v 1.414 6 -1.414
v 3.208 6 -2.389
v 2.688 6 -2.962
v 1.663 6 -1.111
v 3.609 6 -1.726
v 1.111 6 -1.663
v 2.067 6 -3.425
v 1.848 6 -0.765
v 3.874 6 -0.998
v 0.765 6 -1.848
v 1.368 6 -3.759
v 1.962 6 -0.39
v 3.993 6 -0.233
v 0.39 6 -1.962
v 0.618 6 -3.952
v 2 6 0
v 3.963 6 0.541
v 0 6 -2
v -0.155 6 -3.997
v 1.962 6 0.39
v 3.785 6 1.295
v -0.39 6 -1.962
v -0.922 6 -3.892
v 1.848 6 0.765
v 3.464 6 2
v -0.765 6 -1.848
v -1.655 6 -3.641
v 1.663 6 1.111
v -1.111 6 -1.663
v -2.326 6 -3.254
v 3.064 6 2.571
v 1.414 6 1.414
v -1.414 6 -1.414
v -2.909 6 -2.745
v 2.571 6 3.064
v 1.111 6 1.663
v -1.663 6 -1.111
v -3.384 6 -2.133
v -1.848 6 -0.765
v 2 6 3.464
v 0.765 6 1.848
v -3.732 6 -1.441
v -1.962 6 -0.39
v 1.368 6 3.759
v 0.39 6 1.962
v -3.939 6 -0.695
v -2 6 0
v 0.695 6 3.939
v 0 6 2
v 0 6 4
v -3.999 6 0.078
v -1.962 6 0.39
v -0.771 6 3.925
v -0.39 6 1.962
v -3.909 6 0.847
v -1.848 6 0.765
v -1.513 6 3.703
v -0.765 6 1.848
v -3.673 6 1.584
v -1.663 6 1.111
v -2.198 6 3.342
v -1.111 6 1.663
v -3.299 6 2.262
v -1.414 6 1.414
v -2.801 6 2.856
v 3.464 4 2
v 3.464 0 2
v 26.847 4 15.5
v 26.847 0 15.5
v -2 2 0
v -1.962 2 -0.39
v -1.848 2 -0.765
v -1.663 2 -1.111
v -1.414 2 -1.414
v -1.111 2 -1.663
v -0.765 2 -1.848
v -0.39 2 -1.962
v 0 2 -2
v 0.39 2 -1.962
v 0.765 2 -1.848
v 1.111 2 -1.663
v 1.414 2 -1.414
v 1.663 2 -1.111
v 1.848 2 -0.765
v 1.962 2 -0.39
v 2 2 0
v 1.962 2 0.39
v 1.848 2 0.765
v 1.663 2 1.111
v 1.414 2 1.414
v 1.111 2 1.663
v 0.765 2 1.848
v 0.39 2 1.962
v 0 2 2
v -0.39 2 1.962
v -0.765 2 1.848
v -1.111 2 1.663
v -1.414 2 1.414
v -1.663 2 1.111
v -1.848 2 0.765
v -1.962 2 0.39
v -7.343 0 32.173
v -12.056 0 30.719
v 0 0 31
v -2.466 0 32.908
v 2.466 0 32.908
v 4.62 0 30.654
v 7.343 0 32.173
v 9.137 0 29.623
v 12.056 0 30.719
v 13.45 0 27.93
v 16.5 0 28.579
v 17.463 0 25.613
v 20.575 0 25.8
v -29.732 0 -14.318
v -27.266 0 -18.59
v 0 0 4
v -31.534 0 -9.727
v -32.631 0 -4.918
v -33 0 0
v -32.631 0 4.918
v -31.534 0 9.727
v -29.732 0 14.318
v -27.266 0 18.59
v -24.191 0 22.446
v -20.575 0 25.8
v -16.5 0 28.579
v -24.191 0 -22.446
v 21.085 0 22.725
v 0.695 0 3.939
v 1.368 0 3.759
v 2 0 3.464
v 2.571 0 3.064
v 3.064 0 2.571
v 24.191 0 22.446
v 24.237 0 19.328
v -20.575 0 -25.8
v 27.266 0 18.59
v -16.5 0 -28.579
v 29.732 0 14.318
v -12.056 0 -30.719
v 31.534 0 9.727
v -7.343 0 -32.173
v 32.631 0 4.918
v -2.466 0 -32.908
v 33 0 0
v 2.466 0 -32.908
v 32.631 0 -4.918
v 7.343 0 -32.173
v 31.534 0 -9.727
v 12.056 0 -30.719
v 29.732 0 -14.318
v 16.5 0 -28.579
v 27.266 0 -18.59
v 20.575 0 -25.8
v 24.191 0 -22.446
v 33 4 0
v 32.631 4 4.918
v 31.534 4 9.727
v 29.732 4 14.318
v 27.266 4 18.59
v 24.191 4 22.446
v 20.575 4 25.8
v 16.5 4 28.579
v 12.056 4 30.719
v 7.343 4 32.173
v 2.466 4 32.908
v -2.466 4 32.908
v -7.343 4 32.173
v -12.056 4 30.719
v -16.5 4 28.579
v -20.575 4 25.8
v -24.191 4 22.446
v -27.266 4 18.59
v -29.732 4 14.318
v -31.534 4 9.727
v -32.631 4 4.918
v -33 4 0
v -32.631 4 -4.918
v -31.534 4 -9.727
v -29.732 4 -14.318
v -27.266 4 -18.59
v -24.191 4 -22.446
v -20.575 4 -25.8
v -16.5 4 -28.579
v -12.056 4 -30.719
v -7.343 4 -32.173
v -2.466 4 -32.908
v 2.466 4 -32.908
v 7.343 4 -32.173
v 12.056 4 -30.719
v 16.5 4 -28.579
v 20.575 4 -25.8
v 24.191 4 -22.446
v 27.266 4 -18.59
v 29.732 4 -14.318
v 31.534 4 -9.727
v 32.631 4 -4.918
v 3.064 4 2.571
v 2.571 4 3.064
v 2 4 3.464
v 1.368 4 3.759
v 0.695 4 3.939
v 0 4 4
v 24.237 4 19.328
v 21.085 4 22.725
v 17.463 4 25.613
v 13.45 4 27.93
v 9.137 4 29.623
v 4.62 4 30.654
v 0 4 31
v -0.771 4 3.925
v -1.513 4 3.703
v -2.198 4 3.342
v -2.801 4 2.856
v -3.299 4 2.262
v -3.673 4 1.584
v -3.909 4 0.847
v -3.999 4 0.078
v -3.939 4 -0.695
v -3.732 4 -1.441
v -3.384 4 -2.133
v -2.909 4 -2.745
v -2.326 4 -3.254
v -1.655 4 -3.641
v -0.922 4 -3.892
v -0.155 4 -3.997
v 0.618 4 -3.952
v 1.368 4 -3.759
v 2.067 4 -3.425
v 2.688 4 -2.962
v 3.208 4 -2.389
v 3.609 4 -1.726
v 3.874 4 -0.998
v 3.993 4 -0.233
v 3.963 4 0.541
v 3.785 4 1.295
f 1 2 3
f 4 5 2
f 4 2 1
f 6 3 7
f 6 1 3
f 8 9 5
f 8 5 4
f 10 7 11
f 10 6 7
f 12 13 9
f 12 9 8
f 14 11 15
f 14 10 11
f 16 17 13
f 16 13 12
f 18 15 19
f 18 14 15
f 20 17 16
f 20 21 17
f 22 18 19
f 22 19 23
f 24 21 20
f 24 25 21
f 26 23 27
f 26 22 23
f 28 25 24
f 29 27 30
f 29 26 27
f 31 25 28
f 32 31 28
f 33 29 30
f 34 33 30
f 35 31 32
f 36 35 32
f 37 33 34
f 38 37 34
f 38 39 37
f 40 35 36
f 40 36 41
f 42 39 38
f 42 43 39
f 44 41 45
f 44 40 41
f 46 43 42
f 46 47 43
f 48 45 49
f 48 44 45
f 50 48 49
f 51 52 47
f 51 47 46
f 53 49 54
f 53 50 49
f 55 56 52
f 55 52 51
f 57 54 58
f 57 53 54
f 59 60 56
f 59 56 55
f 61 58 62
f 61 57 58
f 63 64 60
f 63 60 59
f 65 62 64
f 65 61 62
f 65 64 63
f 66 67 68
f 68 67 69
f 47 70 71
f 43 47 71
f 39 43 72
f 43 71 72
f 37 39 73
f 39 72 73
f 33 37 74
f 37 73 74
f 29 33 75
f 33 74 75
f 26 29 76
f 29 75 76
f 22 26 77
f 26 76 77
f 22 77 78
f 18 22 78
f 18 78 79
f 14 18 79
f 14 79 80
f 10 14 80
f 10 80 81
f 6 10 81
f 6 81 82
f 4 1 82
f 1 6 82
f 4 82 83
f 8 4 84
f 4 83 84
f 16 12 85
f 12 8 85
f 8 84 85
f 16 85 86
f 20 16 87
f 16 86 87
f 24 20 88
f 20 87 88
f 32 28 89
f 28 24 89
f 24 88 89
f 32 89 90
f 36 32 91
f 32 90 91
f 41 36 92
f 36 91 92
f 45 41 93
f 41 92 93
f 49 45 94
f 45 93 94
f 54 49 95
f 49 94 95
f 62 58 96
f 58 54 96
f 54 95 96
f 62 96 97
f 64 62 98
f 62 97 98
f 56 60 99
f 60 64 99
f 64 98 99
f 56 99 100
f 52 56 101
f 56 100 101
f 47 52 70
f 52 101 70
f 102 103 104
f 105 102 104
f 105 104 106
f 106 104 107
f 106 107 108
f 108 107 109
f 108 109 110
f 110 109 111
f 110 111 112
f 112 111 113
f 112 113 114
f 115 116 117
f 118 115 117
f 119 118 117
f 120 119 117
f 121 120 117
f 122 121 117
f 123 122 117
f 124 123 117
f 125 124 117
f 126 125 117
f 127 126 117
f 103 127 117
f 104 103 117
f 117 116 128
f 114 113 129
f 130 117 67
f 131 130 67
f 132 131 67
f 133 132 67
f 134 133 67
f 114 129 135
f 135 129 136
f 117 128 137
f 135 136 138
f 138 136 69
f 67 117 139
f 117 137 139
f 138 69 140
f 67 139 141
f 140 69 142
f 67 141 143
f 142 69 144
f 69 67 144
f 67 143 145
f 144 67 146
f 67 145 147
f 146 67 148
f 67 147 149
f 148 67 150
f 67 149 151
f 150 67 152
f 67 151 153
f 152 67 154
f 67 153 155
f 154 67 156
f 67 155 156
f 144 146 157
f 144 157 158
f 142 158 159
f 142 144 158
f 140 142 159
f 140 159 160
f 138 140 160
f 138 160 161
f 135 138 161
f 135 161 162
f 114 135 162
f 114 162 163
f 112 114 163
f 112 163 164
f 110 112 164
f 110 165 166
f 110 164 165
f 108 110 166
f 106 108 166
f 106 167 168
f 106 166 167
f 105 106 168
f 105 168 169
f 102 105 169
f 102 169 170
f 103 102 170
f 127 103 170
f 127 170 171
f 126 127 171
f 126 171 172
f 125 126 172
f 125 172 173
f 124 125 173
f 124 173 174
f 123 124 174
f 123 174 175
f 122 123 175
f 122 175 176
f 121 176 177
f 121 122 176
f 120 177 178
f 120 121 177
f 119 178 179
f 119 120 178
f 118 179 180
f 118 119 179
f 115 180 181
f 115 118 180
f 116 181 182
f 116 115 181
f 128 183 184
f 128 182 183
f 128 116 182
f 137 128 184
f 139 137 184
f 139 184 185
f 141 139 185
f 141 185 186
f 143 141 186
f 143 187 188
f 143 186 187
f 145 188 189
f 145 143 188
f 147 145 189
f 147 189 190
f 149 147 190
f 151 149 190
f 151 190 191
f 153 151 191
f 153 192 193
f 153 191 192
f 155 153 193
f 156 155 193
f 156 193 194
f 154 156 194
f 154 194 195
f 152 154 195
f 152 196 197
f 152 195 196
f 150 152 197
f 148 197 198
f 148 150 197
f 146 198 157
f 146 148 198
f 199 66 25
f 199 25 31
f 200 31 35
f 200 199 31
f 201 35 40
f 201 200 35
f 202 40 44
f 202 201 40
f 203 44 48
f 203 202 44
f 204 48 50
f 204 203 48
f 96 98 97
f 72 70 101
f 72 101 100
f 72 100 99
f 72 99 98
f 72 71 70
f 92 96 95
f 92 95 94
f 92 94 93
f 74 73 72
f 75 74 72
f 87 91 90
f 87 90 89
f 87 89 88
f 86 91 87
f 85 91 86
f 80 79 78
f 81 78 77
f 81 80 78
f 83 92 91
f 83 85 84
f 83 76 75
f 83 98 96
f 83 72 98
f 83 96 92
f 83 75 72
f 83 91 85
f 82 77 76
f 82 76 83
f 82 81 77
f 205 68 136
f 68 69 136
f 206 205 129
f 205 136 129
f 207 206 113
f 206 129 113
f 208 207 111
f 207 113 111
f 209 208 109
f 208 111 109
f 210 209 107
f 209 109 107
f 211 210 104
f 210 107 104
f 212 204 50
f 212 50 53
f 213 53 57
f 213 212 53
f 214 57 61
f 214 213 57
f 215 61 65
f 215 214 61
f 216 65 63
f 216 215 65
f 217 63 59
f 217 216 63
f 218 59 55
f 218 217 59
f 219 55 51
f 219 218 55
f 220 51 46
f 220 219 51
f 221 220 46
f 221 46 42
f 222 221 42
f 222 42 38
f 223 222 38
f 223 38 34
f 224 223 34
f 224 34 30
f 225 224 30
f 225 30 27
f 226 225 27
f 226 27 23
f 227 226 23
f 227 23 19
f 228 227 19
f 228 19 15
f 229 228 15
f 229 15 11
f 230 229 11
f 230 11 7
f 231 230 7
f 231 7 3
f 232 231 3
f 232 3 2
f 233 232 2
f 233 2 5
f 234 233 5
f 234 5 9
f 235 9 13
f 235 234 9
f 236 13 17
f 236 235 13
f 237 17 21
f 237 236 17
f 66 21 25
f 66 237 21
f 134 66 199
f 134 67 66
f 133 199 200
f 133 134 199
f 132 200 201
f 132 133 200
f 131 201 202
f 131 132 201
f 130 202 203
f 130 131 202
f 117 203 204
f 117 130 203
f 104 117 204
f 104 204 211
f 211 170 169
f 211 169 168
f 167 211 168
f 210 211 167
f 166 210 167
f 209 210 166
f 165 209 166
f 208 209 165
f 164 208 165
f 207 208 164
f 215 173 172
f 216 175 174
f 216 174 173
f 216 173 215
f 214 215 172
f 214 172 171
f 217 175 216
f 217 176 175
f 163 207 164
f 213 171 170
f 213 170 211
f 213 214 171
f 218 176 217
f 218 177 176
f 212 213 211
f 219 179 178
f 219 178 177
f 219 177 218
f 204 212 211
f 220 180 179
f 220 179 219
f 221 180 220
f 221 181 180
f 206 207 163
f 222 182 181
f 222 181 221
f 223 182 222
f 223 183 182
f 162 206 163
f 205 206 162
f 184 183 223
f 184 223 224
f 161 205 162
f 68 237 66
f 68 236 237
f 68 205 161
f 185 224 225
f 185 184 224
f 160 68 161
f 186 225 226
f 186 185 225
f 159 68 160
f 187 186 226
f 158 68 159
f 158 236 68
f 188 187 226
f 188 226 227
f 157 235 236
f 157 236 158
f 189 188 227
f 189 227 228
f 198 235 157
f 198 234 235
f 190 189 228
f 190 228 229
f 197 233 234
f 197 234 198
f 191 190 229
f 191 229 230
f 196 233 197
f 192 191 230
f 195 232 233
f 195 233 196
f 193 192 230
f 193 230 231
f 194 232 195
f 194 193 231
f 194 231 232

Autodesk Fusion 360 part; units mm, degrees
sketch "Sketch3" plane through (0, 0, 0) normal (0, 1, 0) x (1, 0, 0)
  circle A0 centre (0, 0) radius 33
  circle A1 centre (0, 0) radius 31
  line L0 (0, 0) -> (0, -31)
  line L1 (0, 0) -> (26.8468, -15.5)
  line L2 (0, 0) -> (31, 0) construction
  circle A2 centre (0, 0) radius 4
  dimension "d8" = 66
  dimension "d9" = 62
  dimension "d10" = 30
  dimension "d11" = 8
extrude "Extrude3" add sketch "Sketch3" along normal blind 4 contours A0 | A1 L0 L1 A2 | L0 L1 A2 | L0 L1 A2 picked at (-10.729, -19.1384)
sketch "Sketch4" plane through (0, 4, 0) normal (0, 1, 0) x (-1, 0, 0)
  arc A0 (0, 31) -> (-26.8468, 15.5) centre (0, 0) ccw
  line L0 (0, 31) -> (0, 4)
  arc A1 (0, 4) -> (-3.4641, 2) centre (0, 0) ccw
  line L1 (-3.4641, 2) -> (-26.8468, 15.5)
  circle A2 centre (0, 0) radius 33
  circle A3 centre (0, 0) radius 2
  circle A4 centre (0, 0) radius 4
  dimension "d14" = 4
  dimension "d15" = 8
extrude "Extrude4" add sketch "Sketch4" along normal blind 2 contours A1 A4
extrude "Extrude5" cut 1 faces at (-0.2436, 4, -0.2863) along direction (0, -1, 0) blind 2
